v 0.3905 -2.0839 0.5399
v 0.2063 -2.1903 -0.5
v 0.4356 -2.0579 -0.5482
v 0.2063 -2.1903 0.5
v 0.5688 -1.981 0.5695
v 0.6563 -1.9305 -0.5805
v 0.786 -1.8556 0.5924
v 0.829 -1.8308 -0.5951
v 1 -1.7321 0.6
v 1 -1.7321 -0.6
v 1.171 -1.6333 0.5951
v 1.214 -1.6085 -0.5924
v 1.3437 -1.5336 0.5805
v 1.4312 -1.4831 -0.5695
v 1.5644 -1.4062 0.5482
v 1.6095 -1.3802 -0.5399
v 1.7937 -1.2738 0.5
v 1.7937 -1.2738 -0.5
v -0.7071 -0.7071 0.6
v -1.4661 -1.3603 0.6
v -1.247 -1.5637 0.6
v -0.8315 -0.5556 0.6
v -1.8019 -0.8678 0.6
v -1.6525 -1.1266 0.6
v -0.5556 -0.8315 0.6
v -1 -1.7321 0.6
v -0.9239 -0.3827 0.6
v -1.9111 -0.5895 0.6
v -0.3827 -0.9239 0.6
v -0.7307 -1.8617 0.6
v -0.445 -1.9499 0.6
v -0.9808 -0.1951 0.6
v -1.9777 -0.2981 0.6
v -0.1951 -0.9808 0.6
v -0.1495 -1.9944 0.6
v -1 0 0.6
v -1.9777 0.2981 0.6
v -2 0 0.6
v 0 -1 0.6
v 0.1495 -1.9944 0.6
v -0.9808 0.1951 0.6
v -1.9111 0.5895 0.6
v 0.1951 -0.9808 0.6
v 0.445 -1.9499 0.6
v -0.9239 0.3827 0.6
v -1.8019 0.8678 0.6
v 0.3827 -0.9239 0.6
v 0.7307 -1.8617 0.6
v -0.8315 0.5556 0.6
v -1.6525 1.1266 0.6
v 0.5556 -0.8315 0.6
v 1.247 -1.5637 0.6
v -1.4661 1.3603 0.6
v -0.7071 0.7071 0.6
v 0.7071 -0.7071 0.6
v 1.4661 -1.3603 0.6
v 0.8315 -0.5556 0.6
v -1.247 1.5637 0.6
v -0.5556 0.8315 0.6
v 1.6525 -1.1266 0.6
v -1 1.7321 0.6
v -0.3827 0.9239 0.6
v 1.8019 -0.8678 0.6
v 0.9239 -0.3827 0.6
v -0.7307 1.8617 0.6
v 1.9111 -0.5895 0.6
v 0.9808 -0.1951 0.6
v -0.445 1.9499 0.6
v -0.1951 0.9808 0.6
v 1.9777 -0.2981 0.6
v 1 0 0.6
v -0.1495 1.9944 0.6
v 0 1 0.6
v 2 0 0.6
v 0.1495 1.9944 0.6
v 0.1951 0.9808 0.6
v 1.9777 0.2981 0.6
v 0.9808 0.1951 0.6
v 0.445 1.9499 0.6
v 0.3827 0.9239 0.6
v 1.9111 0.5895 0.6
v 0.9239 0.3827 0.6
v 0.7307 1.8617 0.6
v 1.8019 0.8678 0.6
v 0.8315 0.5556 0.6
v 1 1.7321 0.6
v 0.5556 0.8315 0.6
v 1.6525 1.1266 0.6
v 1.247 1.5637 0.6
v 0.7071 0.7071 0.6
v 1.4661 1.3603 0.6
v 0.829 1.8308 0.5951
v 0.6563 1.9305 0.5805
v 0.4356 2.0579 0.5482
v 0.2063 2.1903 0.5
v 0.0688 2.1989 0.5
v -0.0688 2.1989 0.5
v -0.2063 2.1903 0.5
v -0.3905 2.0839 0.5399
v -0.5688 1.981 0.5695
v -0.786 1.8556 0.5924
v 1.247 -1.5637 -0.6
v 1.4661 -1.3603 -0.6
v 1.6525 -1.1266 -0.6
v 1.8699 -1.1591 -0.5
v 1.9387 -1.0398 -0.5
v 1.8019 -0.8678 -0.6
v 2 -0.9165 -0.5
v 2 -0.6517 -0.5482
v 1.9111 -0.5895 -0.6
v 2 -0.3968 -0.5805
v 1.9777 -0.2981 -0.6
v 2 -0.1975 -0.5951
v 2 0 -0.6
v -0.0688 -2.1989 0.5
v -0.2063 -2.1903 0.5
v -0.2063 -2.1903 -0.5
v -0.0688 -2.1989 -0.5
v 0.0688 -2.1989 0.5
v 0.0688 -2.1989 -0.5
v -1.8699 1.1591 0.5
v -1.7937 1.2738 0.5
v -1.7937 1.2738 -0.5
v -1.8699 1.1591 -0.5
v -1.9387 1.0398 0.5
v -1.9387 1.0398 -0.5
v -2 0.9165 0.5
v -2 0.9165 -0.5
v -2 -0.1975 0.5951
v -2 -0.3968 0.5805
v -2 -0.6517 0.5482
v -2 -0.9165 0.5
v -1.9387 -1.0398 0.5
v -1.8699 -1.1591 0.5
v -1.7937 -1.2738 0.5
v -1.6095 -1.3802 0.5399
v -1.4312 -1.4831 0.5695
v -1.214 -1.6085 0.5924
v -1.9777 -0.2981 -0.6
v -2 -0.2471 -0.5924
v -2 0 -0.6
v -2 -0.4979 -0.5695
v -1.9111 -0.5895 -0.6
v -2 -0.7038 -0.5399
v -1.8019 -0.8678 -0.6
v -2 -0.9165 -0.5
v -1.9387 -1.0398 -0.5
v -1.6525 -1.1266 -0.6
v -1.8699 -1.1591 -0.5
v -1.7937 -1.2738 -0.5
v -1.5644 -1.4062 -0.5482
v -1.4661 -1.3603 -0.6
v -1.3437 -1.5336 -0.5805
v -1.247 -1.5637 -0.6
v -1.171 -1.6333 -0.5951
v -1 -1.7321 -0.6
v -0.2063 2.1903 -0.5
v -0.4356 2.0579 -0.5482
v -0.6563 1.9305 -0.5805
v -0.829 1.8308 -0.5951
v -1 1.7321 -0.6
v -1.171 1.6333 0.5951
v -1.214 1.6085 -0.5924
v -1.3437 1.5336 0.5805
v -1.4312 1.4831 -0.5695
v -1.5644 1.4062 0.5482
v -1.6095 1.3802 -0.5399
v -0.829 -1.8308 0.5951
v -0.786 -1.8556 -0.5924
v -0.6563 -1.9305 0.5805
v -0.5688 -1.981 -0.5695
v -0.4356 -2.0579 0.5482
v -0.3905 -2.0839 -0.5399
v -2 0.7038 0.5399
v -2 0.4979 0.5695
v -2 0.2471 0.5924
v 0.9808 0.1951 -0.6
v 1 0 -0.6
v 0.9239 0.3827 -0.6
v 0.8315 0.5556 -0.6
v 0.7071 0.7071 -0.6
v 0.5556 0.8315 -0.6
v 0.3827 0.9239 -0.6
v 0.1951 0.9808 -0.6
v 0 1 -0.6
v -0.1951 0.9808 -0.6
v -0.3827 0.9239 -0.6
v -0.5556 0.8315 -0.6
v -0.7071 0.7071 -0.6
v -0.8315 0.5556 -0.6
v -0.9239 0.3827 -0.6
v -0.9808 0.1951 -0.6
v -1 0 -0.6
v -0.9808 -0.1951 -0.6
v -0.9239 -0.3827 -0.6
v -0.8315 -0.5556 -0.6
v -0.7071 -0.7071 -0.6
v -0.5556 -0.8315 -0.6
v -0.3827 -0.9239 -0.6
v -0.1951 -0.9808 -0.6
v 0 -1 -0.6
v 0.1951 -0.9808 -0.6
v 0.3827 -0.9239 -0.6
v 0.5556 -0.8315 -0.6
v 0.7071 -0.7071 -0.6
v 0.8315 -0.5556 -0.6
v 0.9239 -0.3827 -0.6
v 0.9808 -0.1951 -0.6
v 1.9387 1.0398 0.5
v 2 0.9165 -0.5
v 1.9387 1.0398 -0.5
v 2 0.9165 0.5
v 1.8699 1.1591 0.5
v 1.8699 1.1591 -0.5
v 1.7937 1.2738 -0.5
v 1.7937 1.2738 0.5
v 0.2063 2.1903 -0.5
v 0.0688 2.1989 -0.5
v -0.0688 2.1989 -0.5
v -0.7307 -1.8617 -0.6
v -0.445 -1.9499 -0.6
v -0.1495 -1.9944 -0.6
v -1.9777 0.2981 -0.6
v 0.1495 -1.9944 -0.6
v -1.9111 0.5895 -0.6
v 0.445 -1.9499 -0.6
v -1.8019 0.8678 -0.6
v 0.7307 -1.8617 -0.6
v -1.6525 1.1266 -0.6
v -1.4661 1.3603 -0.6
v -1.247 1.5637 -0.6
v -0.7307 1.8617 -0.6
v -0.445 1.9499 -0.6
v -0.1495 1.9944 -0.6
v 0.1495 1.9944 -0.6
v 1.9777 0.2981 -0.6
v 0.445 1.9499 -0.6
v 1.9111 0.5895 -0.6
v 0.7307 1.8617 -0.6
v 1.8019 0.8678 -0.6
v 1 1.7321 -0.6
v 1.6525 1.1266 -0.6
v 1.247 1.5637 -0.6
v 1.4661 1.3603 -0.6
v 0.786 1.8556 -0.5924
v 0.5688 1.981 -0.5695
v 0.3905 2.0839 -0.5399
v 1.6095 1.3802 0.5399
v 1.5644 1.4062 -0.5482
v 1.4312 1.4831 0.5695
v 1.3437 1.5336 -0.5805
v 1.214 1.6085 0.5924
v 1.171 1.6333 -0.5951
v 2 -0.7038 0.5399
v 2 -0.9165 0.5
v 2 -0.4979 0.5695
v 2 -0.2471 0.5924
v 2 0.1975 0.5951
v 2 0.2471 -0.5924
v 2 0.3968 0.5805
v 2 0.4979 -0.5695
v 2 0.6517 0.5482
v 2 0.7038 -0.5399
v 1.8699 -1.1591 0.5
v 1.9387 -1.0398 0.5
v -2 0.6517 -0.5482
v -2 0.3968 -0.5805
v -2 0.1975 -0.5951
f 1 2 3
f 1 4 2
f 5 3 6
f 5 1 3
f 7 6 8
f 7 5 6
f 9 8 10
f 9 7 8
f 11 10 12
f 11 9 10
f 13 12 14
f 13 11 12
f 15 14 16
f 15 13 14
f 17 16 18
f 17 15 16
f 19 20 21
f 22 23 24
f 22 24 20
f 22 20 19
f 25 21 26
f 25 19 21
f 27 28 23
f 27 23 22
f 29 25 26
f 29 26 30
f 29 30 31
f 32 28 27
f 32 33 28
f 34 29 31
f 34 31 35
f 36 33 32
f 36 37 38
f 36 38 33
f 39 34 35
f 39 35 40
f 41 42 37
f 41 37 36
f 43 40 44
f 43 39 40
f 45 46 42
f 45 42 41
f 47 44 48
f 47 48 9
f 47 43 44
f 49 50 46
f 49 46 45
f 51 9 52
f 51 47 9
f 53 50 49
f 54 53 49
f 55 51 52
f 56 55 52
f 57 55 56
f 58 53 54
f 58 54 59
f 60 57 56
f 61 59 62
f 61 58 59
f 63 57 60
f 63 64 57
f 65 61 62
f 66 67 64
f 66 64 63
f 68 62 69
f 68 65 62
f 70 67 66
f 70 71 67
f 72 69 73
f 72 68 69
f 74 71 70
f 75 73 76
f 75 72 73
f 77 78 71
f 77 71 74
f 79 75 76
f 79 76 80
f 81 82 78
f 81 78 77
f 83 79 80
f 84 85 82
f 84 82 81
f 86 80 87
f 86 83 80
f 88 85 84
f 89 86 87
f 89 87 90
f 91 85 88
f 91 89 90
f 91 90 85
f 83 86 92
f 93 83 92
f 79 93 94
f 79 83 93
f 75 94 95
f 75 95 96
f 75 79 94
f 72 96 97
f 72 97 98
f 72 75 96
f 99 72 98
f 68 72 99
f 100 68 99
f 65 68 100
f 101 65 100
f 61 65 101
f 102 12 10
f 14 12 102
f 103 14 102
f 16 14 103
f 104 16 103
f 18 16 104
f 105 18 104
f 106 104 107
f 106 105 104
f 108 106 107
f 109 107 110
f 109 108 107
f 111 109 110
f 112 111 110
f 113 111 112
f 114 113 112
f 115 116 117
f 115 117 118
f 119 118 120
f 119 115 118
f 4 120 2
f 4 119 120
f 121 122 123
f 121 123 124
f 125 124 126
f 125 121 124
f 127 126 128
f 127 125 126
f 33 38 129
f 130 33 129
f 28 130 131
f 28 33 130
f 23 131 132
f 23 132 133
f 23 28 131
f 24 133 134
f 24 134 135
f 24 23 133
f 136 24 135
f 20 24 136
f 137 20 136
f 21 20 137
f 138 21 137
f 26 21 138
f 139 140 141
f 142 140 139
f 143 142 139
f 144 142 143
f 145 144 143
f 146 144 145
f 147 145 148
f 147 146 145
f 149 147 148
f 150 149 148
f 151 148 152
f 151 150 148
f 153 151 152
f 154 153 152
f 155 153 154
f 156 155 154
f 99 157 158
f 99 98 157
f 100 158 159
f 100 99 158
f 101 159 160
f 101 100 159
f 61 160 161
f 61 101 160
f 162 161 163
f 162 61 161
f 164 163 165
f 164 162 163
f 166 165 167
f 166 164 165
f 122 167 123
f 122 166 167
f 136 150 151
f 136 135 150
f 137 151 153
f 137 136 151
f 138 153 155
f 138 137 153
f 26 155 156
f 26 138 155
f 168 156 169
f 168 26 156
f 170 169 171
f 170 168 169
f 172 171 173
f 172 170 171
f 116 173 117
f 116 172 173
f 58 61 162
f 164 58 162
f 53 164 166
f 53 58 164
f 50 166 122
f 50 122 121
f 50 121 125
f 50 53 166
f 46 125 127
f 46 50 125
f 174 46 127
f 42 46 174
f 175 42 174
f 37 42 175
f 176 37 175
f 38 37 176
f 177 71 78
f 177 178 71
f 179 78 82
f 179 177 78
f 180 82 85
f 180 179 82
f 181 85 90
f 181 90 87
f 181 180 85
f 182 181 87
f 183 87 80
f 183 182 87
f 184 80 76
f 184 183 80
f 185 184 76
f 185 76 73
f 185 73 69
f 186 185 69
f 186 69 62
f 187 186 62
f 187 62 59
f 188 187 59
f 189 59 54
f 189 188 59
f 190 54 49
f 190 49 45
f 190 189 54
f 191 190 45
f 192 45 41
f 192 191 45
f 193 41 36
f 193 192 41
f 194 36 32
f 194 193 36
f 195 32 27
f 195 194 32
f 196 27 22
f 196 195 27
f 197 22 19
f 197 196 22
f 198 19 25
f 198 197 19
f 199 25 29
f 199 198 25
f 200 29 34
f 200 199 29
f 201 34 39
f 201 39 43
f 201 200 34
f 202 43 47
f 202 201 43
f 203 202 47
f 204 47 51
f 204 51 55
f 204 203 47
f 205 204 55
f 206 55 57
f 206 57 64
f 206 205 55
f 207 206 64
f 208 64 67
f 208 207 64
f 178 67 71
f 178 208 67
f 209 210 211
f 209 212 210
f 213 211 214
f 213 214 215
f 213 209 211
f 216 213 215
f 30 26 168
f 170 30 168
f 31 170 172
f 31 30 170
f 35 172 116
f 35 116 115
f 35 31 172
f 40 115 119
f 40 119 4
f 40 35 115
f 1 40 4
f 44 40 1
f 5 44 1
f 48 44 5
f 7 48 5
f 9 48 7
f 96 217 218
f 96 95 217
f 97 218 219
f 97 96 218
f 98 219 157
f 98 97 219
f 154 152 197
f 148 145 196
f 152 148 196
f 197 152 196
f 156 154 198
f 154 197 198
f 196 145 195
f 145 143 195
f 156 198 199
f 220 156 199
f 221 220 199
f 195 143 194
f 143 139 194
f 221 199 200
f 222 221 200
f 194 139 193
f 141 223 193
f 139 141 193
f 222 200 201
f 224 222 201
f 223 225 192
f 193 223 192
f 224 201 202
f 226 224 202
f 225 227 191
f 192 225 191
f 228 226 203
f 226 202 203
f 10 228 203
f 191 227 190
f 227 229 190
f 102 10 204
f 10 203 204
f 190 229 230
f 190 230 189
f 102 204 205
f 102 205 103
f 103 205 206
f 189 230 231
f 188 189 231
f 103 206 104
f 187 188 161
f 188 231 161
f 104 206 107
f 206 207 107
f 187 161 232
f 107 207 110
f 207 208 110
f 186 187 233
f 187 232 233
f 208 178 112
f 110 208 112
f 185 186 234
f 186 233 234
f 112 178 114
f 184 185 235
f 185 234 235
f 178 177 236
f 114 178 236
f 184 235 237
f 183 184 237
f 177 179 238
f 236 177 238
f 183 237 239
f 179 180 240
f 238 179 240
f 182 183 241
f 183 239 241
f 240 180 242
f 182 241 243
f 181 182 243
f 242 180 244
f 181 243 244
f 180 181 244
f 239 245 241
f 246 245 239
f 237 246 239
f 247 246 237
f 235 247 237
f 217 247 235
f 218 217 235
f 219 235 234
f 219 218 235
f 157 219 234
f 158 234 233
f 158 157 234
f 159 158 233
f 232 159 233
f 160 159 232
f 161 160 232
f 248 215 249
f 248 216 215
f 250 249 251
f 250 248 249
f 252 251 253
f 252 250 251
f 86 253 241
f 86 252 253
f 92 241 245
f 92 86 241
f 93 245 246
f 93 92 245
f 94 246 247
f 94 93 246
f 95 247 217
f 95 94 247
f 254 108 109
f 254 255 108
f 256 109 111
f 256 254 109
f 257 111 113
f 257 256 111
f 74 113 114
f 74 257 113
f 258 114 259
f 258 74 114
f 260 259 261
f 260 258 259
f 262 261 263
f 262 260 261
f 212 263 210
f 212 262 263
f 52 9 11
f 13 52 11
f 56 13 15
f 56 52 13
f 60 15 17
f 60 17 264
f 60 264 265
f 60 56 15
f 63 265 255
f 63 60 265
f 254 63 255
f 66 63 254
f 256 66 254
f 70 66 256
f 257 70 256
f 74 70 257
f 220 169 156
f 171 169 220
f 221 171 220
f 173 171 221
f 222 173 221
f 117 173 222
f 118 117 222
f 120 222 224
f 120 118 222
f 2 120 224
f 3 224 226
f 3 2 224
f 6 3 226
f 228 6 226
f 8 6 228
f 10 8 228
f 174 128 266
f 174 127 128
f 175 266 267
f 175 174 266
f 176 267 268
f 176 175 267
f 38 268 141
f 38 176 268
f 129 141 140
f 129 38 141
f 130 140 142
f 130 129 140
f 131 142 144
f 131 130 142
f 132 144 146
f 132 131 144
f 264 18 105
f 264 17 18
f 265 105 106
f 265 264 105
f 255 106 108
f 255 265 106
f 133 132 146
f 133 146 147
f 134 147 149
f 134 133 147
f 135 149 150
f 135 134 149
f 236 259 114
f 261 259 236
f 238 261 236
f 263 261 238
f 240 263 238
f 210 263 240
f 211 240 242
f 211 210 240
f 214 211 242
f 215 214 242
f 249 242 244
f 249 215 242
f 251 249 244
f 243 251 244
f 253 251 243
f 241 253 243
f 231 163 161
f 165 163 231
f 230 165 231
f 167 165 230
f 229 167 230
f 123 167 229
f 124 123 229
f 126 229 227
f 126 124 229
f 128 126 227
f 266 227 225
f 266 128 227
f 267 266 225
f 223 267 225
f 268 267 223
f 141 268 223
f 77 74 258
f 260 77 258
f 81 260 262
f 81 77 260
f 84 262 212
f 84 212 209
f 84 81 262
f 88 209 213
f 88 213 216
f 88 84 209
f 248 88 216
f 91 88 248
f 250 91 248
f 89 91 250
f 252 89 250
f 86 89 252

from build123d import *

# Parameters (mm, degrees)
SKETCH_R  = 1
PAD_DEPTH = 0.6


with BuildPart() as body001:
    # Sketch001 → Revolution (revolve)
    with BuildSketch(Plane.YZ):
        Polygon((2.2, 0.5), (1.7, 0.75), (2.5, 0.75), (2.5, -0.75), (1.7, -0.75), (2.2, -0.5), align=None)
    revolve(axis=Axis((0, 0, 0), (0, 0, 1)))


with BuildPart() as cut:
    # Sketch → Pad (new body, symmetric)
    with BuildSketch(Plane.XY):
        Polygon((2, 1.154701), (0, 2.309401), (-2, 1.154701), (-2, -1.154701), (0, -2.309401), (2, -1.154701), align=None)
        Circle(SKETCH_R, mode=Mode.SUBTRACT)
    extrude(amount=PAD_DEPTH, both=True)

    # Cut: cut Body001
    add(body001.part, mode=Mode.SUBTRACT)


solid = cut.part
